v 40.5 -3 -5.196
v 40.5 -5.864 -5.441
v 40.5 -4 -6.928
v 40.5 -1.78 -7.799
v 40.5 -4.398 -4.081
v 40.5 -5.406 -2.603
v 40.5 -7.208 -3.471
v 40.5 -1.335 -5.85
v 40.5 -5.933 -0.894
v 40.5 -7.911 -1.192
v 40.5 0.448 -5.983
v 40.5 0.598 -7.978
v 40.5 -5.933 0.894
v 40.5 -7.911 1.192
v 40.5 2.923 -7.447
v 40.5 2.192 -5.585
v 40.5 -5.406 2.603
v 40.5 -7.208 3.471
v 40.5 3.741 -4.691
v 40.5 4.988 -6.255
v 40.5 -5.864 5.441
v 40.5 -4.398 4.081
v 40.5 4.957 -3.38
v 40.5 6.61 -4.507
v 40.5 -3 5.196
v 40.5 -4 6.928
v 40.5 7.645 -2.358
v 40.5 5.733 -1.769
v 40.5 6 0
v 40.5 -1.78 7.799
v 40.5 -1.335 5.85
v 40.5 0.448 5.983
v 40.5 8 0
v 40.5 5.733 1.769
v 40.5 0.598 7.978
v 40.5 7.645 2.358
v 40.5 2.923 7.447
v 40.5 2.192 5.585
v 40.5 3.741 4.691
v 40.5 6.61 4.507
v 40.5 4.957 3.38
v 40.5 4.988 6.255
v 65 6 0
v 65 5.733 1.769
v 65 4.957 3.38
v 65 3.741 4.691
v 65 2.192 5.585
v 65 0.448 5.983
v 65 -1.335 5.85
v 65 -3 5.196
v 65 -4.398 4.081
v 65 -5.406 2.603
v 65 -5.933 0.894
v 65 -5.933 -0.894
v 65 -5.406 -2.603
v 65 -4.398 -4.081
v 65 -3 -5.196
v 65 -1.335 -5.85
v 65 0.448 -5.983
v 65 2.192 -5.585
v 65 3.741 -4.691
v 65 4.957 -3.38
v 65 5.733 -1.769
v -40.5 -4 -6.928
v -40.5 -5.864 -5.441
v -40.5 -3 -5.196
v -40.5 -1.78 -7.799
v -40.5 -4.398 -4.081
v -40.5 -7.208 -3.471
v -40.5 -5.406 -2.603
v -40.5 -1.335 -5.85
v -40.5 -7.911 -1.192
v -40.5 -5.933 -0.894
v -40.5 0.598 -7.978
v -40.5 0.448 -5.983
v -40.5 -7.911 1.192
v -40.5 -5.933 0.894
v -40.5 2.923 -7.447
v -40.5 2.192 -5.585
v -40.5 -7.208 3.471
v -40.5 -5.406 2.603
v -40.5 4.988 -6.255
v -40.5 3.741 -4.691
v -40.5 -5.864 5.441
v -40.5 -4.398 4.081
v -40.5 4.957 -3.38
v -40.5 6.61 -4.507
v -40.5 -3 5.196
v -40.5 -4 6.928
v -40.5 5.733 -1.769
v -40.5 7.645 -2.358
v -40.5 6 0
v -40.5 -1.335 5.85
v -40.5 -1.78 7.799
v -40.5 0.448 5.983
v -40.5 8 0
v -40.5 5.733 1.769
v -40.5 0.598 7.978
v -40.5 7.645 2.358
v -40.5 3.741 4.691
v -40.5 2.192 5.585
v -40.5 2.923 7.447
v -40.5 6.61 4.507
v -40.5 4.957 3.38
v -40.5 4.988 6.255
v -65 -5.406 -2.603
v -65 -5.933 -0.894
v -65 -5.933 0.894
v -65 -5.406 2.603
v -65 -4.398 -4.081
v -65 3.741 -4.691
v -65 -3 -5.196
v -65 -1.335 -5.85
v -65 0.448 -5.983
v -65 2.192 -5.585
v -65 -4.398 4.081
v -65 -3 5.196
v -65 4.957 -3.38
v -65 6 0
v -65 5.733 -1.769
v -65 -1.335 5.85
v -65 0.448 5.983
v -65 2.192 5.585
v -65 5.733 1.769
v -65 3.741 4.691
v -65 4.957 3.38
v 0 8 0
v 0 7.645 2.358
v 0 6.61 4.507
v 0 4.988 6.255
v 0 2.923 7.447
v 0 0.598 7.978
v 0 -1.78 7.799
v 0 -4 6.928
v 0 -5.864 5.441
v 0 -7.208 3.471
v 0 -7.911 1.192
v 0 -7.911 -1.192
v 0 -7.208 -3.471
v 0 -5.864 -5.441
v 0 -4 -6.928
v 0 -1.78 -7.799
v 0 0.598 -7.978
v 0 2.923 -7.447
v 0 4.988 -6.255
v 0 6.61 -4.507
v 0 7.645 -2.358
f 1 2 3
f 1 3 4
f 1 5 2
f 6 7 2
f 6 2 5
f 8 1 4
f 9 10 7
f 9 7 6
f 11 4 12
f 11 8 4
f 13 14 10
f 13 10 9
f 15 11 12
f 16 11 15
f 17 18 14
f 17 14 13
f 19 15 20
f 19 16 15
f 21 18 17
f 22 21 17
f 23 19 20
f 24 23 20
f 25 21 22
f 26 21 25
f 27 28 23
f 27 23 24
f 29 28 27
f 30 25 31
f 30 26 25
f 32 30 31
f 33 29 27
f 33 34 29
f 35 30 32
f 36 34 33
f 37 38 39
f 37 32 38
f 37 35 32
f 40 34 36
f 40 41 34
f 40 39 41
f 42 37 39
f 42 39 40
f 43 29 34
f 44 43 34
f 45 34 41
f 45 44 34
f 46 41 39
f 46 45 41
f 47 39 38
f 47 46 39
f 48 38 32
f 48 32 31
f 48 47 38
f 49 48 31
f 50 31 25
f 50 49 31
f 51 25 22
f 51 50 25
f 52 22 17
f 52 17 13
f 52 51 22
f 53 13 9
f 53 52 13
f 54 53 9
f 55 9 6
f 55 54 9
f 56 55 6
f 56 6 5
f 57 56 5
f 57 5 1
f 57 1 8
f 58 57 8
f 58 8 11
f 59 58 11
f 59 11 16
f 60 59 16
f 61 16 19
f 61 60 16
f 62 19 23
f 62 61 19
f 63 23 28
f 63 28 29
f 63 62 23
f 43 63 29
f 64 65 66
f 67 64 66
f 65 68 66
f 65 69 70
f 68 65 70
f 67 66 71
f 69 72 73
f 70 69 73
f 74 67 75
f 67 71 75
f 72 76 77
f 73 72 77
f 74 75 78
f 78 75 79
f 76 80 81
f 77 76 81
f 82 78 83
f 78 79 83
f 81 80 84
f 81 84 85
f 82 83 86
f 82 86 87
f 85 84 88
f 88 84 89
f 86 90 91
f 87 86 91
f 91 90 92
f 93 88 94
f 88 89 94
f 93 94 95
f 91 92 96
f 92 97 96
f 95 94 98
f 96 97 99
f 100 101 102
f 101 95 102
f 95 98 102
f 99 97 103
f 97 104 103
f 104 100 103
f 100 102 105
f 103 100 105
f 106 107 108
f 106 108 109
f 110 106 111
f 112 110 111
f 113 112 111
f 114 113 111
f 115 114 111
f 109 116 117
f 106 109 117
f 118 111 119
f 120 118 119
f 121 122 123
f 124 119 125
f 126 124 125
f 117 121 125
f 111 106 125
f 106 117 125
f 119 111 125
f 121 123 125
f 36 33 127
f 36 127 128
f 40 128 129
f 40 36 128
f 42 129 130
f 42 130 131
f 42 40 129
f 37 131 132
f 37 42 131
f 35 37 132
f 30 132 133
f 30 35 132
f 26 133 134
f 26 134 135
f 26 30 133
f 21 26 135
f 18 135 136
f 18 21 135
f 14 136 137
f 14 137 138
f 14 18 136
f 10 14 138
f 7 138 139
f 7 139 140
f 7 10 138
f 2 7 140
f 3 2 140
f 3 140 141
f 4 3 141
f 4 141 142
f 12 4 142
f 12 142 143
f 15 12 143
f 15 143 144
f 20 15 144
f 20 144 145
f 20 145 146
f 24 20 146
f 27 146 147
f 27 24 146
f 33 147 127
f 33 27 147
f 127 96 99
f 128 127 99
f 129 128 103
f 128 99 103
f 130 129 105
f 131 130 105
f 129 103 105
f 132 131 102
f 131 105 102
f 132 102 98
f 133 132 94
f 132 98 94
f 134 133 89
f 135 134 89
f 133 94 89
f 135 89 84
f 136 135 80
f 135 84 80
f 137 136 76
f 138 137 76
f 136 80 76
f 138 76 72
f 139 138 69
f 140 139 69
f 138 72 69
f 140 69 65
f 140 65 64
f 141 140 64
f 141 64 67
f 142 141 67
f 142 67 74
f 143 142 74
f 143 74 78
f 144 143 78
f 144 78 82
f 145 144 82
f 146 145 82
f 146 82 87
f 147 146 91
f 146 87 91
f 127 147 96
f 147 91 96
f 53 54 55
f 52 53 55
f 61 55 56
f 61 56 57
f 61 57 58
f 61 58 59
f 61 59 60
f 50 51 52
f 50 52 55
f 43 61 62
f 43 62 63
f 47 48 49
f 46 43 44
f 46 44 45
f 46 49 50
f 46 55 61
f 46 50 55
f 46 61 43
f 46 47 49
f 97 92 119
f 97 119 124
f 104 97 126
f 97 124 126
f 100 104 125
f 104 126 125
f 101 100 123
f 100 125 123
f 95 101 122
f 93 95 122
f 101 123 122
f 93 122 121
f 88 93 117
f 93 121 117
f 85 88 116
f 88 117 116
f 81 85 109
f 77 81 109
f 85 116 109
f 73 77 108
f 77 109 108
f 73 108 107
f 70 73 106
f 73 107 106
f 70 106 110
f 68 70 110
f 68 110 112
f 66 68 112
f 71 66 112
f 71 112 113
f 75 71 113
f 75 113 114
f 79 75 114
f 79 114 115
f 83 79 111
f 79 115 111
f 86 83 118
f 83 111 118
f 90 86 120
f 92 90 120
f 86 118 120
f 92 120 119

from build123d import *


with BuildPart() as part:
    # Sketch1 → Revolve1 (revolve)
    with BuildSketch(Plane.XY):
        Polygon((0, 0), (0, 8), (-40.5, 8), (-40.5, 6), (-65, 6), (-65, 0), align=None)
    revolve1 = revolve(axis=Axis((-65, 0, 0), (1, 0, 0)))

    # Mirror1: Revolve1 across plane
    add(revolve1.mirror(Plane.ZY))


solid = part.part
